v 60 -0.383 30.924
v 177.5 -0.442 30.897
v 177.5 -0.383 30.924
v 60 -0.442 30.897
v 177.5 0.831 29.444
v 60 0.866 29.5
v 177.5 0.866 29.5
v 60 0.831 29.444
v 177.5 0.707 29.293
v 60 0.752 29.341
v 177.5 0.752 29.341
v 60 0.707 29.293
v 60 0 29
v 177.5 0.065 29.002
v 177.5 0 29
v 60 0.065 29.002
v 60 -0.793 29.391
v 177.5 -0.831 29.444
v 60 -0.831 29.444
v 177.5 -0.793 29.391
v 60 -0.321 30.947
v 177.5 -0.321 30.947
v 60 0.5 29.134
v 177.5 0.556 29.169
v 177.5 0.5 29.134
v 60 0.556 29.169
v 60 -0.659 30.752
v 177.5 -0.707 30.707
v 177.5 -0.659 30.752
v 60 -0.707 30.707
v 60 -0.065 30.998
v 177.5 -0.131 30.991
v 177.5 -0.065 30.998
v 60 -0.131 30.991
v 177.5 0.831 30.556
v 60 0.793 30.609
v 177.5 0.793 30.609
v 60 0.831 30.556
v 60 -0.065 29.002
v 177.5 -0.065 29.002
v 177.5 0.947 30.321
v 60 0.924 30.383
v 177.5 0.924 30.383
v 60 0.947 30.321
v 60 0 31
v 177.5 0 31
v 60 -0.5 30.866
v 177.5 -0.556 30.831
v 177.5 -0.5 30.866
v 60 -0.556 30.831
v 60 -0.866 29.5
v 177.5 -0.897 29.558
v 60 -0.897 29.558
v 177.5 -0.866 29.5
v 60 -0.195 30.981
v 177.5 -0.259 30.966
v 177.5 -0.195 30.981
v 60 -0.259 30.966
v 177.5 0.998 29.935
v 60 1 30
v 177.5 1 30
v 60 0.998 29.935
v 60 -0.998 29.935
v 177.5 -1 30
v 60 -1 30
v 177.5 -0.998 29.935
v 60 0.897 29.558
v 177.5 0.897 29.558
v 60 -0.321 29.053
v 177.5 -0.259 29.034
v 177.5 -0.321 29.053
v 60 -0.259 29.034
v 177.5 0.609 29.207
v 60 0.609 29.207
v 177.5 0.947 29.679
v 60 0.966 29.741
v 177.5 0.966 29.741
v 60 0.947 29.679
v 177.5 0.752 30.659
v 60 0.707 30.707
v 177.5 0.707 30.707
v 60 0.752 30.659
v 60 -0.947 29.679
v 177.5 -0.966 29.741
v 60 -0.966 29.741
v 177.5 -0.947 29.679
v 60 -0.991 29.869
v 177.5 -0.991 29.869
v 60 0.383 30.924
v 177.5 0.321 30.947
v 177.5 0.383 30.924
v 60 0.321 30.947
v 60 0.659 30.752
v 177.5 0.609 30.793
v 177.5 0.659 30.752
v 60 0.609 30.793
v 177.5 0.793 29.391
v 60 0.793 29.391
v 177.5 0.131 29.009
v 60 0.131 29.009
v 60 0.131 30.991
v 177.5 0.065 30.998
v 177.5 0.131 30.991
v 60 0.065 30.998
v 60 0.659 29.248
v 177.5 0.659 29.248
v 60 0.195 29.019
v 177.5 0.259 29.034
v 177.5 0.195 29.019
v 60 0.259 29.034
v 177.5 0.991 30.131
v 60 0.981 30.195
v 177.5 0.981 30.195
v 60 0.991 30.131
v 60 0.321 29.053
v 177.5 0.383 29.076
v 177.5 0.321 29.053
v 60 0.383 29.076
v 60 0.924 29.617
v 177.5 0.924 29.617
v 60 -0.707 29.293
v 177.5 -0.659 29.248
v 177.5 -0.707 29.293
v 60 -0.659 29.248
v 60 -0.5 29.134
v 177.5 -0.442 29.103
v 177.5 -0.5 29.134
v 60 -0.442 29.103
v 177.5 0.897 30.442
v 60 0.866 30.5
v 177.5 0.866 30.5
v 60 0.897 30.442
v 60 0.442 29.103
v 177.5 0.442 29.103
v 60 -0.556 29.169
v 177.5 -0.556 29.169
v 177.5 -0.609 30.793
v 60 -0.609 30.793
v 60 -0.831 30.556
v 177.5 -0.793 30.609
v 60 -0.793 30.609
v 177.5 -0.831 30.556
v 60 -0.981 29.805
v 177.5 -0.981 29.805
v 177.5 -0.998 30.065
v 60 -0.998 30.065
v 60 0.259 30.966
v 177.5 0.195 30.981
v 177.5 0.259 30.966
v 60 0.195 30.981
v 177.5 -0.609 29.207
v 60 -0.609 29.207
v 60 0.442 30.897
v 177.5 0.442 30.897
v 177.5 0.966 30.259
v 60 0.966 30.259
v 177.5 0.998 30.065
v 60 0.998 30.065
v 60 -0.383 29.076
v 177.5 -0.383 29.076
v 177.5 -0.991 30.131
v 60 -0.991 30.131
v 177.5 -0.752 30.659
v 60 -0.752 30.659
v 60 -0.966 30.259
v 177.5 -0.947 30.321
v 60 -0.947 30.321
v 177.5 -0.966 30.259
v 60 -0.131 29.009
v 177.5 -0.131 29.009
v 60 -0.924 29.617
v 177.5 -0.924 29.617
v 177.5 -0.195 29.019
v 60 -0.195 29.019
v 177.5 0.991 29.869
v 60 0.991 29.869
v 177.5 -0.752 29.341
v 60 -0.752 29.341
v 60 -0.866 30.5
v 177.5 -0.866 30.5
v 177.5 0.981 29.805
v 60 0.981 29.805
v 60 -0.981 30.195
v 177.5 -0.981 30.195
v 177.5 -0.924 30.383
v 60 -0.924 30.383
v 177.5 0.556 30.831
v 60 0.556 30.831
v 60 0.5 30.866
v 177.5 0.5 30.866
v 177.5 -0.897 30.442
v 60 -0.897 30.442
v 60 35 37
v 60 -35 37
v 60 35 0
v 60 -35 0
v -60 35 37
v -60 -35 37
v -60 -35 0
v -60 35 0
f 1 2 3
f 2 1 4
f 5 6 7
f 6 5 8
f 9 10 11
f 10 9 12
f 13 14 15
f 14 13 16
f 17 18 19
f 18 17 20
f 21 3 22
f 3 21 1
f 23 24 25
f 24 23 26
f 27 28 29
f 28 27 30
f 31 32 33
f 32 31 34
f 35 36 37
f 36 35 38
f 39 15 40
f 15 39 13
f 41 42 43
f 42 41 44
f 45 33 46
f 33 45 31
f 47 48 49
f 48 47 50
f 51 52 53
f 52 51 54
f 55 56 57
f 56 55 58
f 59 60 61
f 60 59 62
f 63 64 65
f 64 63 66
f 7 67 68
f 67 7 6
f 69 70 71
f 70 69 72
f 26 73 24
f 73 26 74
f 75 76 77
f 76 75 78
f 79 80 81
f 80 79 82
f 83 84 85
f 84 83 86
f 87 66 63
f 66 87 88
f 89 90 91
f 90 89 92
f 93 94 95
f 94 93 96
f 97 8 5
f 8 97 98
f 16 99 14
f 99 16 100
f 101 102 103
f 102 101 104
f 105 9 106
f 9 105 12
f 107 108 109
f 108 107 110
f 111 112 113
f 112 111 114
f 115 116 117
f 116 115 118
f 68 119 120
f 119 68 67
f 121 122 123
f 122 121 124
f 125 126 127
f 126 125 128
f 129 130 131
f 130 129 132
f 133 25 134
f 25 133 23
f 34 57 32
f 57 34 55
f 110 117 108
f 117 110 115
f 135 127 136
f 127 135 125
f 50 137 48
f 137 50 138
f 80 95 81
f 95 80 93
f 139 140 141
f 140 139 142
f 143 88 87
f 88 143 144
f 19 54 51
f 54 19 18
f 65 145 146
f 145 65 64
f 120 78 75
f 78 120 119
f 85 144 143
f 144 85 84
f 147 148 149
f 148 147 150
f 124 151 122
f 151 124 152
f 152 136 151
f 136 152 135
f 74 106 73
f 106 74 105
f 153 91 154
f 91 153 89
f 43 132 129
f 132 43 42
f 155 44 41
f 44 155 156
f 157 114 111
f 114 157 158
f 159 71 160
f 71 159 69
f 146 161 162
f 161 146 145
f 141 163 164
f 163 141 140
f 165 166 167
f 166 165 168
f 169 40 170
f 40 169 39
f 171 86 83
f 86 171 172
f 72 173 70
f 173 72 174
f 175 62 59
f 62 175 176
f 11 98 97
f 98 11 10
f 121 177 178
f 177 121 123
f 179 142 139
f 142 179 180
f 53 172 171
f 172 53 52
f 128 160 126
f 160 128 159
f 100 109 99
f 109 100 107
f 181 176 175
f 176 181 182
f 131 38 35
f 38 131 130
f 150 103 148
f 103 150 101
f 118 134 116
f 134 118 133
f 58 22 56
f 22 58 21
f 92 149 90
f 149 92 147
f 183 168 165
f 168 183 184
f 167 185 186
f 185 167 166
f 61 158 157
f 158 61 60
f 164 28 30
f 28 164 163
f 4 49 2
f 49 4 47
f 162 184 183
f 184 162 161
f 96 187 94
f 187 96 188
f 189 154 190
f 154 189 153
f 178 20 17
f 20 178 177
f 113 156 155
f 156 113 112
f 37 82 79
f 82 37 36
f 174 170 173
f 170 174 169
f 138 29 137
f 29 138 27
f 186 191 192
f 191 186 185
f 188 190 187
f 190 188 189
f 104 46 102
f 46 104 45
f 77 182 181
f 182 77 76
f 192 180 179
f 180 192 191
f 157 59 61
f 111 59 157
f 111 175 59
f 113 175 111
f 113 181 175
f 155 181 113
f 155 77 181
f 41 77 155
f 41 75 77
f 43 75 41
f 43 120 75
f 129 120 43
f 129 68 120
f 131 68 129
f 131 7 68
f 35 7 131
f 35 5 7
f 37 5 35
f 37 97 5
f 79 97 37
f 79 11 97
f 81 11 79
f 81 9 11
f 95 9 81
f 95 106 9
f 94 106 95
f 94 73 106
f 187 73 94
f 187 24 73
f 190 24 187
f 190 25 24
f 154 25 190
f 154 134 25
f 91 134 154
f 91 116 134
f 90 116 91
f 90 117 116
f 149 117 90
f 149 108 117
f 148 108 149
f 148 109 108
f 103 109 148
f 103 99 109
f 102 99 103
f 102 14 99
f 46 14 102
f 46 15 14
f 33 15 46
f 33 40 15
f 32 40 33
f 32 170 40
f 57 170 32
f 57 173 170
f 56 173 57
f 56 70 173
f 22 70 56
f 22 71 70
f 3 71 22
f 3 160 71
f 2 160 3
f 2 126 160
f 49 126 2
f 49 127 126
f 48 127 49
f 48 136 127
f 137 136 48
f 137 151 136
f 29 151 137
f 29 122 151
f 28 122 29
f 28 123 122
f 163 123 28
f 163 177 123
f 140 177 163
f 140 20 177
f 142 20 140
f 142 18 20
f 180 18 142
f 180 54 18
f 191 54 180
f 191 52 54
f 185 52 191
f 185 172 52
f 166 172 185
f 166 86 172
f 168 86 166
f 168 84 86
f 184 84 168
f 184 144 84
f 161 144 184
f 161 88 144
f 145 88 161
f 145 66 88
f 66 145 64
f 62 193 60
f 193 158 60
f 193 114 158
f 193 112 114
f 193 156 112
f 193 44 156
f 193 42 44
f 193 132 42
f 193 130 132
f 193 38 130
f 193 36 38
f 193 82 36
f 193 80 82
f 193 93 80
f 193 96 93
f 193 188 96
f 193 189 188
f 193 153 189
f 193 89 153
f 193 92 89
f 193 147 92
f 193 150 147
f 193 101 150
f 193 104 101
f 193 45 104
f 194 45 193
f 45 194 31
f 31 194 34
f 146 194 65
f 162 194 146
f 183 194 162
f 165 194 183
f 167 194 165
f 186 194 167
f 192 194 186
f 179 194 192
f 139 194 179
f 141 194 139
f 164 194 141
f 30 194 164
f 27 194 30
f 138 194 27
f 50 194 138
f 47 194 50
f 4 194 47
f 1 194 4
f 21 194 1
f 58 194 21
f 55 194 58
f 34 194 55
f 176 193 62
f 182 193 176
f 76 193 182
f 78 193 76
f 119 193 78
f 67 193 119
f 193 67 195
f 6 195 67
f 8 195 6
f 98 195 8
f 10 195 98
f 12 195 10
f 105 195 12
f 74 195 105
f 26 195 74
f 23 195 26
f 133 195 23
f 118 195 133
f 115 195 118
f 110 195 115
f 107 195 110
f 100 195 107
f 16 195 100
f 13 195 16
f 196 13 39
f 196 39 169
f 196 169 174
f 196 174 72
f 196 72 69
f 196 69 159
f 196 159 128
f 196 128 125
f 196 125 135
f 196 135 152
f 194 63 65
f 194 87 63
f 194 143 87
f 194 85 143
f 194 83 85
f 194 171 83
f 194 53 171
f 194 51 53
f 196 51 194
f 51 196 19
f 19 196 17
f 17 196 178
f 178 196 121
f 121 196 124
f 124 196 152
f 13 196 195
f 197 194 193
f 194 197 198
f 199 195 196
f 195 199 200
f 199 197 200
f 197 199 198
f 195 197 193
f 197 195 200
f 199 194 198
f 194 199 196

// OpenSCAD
// Mini horizontal gel-electrophoresis box - buffer tank
// Print orientation: tank rests on XY plane (z = 0), builds upward (+Z)

// ---------------- Parameters ----------------
outer_x      = 120;   // outer length in X (mm)
outer_y      = 70;    // outer width in Y (mm)
outer_z      = 40;    // outer height in Z (mm)

wall         = 3;     // wall thickness (mm)
floor        = 3;     // floor thickness (mm)

platform_x   = 60;    // platform length along X (mm)
platform_y   = outer_y; // platform spans full inner width (mm)
platform_top = 13;    // platform top height above outer bottom (mm)

hole_d       = 2;     // electrode hole diameter (mm)
hole_y       = 0;     // electrode hole Y position (mm)
hole_z       = 30;    // electrode hole Z position (mm)

eps          = 0.5;   // cutter overshoot past faces (mm)
$fn          = 96;    // curve resolution

// Derived
inner_x = outer_x - 2 * wall;   // 114 mm
inner_z = outer_z - floor;      // 37 mm (floor at z = 0..3)
plat_h  = platform_top - floor; // 10 mm (platform sits on inner floor)

// ---------------- Model ----------------
union() {
    // Tank body (floor + side walls, open top)
    translate([-outer_x / 2, -outer_y / 2, 0])
        cube([outer_x, outer_y, outer_z - wall]);

    // Raised platform for gel tray (centred in X, spans full width)
    translate([-inner_x / 2, -platform_y / 2, floor])
        cube([platform_x, platform_y, plat_h]);

    // Electrode holes through each end wall along X
    for (sx = [-1, 1])
        translate([sx > 0 ? inner_x / 2 - eps : -inner_x / 2, hole_y, hole_z])
            rotate([0, 90, 0])
                cylinder(d = hole_d, h = outer_x + 2 * eps);
}
